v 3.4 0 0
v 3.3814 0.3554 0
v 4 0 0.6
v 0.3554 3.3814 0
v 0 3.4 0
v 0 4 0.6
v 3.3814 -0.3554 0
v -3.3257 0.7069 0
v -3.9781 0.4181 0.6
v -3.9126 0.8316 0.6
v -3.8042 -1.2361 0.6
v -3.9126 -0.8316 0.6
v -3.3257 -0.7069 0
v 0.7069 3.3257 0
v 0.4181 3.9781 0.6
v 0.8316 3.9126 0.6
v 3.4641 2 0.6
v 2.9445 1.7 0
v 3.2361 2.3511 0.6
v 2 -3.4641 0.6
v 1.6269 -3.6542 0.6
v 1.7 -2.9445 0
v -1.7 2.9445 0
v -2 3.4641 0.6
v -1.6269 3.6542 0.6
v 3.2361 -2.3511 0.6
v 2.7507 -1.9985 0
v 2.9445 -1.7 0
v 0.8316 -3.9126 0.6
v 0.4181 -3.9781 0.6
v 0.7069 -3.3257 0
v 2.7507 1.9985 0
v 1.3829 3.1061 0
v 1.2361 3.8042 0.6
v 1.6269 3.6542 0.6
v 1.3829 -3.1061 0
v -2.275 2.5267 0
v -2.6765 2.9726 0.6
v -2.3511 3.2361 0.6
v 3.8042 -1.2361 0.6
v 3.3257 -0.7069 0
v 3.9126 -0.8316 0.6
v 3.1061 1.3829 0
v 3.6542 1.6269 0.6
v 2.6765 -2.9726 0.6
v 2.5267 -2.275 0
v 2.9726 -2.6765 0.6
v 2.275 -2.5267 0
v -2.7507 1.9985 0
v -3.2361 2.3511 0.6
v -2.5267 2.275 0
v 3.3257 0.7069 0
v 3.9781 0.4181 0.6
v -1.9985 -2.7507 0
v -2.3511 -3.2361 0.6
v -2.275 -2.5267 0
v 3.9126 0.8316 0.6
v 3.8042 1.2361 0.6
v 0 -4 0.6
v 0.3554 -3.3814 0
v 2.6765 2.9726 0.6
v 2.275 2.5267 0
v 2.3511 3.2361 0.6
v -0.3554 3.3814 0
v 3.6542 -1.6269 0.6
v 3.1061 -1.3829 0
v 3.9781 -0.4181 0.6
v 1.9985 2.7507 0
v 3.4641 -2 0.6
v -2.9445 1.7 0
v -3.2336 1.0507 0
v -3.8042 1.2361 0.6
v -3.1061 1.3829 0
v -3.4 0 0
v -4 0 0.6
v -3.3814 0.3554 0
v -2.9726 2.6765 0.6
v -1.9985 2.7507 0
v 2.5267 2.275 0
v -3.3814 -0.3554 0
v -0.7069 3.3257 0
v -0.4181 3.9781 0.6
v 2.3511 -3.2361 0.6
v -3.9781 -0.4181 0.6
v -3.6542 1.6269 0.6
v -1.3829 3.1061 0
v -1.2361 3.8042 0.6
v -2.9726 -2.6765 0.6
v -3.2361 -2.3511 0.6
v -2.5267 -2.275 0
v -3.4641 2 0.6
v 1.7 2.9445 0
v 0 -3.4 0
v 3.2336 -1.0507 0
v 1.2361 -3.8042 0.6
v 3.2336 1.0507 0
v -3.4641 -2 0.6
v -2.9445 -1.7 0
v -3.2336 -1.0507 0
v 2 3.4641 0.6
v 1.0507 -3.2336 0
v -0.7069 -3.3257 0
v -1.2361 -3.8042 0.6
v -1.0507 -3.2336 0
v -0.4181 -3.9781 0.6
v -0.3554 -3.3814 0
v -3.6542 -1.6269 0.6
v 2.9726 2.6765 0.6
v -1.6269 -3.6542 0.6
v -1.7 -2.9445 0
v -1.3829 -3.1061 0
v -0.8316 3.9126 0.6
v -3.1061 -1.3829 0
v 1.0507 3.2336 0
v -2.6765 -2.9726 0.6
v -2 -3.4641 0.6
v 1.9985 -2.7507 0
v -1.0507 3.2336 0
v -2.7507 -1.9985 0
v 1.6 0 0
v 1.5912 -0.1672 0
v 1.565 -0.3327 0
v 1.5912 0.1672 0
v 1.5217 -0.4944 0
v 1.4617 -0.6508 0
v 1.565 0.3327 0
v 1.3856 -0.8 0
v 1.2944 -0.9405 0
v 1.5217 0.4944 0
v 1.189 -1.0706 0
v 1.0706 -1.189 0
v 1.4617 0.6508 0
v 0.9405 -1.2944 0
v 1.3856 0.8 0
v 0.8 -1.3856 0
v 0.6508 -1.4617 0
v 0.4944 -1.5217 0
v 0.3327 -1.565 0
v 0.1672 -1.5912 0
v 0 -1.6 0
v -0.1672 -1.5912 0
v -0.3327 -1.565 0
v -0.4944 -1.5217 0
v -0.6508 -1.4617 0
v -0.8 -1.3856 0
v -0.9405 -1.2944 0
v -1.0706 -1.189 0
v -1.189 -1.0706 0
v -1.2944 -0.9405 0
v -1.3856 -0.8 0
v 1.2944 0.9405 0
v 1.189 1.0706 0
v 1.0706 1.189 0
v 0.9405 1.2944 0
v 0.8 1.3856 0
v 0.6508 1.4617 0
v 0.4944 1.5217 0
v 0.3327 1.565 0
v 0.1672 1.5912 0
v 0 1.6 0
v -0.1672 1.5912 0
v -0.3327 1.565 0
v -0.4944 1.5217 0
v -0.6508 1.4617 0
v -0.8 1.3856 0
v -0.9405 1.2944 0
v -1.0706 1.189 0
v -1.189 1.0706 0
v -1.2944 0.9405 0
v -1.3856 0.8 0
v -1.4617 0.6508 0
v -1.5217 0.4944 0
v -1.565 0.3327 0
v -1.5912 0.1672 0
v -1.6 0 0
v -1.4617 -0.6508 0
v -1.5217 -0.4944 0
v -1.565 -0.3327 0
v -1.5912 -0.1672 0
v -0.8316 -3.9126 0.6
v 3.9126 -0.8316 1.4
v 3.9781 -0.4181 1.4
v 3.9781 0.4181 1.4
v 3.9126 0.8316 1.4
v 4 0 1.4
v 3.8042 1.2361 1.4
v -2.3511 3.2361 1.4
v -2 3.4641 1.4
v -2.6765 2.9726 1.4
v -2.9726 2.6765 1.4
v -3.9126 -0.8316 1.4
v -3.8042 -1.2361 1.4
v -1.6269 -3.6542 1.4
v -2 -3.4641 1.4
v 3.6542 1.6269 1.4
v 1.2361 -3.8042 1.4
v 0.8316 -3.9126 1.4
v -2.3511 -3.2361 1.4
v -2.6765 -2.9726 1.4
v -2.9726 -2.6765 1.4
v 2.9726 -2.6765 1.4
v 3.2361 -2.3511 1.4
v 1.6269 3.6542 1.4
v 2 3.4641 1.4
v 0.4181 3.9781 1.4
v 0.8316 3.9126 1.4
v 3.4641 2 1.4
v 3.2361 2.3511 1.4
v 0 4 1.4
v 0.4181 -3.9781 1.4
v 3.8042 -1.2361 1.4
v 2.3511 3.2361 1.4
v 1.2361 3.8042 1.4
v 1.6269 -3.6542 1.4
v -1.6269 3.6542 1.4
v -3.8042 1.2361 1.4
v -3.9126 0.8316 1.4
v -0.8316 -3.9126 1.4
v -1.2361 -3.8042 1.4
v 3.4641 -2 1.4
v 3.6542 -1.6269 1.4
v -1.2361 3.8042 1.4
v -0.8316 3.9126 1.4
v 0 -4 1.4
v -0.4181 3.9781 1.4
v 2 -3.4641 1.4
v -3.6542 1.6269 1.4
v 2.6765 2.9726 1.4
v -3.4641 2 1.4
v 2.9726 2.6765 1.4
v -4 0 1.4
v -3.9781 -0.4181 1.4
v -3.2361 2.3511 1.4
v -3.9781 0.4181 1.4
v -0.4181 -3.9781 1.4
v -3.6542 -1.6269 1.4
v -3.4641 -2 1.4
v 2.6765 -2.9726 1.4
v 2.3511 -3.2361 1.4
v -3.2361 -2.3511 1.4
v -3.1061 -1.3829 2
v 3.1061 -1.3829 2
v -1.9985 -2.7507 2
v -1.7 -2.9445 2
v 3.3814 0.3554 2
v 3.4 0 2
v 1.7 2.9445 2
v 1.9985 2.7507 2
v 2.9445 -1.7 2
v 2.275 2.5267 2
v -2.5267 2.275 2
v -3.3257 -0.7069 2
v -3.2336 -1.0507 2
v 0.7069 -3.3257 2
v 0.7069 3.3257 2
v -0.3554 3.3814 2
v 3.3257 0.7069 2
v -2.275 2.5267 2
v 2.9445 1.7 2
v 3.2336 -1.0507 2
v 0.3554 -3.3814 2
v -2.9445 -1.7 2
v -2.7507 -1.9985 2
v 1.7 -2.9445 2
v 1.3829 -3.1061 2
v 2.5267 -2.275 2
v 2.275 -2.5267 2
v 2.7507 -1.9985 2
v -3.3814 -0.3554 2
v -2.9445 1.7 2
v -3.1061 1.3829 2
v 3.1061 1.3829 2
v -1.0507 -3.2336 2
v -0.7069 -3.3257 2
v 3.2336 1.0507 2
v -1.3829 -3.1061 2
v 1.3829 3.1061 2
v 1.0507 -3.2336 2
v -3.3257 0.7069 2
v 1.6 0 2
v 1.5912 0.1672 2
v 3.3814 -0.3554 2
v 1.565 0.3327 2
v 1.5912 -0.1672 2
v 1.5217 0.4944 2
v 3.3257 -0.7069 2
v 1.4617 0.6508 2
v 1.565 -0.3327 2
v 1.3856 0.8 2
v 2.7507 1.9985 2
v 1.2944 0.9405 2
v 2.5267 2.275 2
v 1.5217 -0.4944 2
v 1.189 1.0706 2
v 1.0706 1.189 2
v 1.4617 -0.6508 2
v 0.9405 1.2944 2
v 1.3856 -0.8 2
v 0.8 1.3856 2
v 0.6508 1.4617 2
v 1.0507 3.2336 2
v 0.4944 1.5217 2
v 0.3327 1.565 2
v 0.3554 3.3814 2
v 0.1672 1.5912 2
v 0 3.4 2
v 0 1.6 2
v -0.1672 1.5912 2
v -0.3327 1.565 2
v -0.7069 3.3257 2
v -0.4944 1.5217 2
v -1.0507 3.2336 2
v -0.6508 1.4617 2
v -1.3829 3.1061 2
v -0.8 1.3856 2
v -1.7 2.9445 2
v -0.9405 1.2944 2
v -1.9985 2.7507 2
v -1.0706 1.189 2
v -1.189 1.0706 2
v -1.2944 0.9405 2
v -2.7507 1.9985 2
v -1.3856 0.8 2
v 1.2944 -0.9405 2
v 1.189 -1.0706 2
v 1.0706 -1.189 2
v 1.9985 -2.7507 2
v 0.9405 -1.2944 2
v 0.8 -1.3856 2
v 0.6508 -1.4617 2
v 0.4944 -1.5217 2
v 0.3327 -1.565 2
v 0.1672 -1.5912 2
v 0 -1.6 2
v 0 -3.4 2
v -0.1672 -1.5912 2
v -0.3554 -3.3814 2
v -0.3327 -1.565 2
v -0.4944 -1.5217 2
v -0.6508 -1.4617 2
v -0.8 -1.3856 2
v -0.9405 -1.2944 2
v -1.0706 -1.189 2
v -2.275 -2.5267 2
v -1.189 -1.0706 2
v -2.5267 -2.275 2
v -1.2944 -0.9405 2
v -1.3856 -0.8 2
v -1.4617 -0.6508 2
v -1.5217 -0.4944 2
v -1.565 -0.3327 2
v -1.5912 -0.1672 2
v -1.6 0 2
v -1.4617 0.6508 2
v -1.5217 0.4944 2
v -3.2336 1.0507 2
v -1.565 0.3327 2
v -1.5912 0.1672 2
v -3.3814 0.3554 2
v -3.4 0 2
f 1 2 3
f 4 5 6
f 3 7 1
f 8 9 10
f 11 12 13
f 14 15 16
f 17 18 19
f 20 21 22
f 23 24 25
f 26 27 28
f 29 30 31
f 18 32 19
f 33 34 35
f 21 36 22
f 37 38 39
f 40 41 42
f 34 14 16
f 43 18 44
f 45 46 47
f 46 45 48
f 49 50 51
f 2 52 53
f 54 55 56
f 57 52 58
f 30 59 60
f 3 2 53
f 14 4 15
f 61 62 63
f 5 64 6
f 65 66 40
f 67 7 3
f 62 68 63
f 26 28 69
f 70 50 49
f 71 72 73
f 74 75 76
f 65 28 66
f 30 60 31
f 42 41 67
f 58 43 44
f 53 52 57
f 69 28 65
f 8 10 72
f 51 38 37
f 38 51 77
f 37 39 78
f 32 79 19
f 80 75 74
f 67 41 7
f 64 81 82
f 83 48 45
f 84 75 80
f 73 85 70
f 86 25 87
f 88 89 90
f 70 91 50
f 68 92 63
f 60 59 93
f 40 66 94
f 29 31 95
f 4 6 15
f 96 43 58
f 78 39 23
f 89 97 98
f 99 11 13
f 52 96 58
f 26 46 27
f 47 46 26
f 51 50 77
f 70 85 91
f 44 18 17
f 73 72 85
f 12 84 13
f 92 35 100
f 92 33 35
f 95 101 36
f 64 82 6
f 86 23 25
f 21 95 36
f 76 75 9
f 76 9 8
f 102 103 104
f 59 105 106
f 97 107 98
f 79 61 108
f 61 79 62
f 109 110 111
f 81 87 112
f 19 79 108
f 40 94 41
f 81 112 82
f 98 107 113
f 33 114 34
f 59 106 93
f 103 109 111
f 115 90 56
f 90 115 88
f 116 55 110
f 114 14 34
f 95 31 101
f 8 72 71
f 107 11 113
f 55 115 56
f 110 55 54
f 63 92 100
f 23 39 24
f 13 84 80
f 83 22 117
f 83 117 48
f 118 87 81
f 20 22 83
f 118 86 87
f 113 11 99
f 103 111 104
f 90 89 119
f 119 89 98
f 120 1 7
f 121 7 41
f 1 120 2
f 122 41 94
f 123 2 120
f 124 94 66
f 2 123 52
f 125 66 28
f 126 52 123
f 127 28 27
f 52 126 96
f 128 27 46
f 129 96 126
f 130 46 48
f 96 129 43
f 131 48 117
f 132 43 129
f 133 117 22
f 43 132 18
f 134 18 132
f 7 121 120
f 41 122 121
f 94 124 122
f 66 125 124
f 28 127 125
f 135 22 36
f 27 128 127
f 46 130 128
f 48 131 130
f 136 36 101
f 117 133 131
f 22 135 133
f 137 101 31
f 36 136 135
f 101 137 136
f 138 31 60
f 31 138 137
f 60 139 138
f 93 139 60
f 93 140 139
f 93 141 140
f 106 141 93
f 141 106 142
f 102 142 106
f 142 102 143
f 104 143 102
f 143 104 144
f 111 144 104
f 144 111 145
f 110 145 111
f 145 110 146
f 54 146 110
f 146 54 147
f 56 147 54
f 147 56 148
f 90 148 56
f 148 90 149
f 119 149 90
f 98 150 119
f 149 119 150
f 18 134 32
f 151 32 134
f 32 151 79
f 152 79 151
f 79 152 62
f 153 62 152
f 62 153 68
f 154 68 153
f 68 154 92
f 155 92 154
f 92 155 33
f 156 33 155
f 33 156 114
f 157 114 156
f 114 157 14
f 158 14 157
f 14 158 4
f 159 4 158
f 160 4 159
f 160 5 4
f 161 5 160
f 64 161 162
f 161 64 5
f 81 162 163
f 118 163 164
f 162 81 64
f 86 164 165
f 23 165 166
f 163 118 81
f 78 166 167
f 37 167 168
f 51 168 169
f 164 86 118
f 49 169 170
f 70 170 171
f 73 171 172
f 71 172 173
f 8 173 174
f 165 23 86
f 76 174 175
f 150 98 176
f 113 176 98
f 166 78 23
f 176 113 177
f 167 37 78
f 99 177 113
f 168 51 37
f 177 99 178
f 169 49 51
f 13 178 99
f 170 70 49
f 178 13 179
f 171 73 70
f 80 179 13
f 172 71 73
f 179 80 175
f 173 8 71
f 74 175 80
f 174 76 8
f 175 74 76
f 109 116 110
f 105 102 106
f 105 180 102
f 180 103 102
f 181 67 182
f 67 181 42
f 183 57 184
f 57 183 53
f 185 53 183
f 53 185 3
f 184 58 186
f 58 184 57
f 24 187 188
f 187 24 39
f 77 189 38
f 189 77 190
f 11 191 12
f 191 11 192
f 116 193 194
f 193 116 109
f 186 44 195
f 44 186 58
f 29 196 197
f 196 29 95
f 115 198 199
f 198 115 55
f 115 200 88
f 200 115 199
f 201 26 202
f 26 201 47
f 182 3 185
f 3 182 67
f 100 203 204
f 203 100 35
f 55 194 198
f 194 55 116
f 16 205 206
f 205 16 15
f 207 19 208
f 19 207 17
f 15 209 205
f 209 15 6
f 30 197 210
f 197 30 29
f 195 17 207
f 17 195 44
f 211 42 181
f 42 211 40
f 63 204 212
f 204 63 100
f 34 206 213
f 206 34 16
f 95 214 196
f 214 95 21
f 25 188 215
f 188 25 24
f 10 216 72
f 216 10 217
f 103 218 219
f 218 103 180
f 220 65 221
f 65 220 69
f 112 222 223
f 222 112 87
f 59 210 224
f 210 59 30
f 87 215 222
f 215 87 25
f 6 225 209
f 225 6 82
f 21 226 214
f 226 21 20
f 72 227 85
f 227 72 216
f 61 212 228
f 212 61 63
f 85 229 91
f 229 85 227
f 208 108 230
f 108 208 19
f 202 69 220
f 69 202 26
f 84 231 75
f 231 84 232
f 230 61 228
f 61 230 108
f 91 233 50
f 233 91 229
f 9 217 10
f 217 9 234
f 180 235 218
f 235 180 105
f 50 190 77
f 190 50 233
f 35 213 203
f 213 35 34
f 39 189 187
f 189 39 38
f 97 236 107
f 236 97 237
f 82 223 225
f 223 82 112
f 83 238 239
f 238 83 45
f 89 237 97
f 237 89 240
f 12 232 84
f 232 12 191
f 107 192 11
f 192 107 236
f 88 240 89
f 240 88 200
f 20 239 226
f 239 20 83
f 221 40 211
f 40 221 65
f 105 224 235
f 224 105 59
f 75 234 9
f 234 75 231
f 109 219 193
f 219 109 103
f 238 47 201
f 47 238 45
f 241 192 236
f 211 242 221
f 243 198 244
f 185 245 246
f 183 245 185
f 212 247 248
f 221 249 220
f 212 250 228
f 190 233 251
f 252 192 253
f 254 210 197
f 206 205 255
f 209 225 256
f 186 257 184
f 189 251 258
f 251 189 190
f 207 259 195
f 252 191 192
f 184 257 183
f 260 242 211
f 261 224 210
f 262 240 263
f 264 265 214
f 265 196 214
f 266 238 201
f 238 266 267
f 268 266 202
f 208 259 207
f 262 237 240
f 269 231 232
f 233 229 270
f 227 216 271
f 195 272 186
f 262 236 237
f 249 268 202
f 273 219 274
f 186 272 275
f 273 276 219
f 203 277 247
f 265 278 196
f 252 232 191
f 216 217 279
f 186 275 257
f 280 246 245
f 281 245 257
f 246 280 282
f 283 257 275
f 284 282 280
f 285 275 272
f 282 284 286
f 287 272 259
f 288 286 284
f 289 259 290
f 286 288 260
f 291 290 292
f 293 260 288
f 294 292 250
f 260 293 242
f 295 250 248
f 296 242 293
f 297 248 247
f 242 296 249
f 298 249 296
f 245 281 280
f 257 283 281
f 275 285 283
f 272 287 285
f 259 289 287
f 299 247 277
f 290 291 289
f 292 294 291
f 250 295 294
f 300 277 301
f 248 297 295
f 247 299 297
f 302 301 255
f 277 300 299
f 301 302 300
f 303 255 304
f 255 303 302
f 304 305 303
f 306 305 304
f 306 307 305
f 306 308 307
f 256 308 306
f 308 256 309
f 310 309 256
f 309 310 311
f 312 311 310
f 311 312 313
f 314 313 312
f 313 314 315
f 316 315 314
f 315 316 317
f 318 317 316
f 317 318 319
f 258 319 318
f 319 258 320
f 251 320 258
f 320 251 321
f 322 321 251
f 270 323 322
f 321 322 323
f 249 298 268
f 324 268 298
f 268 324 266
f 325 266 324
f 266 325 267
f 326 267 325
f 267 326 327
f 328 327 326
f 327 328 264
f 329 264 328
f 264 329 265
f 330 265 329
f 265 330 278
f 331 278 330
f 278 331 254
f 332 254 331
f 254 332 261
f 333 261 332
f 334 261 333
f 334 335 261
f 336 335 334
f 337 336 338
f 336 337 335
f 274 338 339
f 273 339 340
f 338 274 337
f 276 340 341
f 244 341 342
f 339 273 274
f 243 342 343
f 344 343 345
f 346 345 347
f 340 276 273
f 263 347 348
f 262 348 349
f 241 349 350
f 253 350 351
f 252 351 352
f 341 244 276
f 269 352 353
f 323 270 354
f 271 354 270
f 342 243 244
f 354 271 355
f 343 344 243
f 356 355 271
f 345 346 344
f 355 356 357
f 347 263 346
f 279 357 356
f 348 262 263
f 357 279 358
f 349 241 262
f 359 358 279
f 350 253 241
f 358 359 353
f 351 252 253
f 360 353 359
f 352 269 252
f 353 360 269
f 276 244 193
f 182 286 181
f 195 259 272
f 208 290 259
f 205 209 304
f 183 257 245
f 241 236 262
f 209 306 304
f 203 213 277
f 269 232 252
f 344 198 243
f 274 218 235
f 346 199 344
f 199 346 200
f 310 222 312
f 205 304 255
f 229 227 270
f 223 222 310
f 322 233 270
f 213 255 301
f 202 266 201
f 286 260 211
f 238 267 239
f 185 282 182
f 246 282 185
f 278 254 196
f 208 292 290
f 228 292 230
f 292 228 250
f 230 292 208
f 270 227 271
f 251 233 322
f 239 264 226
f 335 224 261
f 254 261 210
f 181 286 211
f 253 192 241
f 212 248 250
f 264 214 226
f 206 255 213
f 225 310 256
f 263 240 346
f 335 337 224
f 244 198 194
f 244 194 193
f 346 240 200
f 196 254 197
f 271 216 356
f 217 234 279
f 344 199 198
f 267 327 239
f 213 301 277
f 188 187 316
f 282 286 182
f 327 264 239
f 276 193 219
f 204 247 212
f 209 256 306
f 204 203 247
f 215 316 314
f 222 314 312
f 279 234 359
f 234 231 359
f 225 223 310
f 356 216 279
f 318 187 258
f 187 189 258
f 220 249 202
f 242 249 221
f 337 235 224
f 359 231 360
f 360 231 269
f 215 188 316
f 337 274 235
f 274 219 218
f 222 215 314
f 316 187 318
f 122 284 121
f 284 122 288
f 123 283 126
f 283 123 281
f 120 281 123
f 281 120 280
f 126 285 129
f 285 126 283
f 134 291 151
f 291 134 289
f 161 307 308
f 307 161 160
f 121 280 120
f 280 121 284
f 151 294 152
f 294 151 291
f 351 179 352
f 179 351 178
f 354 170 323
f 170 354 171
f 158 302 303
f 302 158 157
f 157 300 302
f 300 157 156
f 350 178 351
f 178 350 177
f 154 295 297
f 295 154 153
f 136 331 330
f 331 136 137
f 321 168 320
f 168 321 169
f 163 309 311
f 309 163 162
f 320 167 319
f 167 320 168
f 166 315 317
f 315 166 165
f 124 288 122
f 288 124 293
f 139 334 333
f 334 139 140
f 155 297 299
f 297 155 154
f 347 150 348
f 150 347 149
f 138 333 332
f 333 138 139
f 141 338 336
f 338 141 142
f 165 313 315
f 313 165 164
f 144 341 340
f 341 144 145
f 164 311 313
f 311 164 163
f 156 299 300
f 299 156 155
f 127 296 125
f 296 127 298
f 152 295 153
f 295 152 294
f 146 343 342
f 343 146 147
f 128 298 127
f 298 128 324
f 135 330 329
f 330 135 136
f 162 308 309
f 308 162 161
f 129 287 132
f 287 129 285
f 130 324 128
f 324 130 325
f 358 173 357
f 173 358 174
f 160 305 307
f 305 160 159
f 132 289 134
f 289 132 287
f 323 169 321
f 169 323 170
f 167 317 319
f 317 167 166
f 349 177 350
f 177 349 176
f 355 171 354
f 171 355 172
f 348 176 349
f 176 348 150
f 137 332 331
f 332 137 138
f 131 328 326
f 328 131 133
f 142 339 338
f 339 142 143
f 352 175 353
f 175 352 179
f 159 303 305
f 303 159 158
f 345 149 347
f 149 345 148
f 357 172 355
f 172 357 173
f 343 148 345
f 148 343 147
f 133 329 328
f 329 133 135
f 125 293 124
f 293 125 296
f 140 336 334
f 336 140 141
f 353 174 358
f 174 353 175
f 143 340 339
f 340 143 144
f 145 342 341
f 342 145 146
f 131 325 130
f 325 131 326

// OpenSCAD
// Chamfered metric washer.
$fn = 60;
eps = 0.02;
inner_d = 3.2;
outer_d = 8;
thickness = 2;
chamfer = 0.6;
difference() {
    union() {
        cylinder(d1 = outer_d - 2 * chamfer, d2 = outer_d, h = chamfer);
        translate([0, 0, chamfer]) cylinder(d = outer_d, h = thickness - 2 * chamfer);
        translate([0, 0, thickness - chamfer]) cylinder(d1 = outer_d, d2 = outer_d - 2 * chamfer, h = chamfer);
    }
    translate([0, 0, -eps]) cylinder(d = inner_d, h = thickness + 2 * eps);
}
